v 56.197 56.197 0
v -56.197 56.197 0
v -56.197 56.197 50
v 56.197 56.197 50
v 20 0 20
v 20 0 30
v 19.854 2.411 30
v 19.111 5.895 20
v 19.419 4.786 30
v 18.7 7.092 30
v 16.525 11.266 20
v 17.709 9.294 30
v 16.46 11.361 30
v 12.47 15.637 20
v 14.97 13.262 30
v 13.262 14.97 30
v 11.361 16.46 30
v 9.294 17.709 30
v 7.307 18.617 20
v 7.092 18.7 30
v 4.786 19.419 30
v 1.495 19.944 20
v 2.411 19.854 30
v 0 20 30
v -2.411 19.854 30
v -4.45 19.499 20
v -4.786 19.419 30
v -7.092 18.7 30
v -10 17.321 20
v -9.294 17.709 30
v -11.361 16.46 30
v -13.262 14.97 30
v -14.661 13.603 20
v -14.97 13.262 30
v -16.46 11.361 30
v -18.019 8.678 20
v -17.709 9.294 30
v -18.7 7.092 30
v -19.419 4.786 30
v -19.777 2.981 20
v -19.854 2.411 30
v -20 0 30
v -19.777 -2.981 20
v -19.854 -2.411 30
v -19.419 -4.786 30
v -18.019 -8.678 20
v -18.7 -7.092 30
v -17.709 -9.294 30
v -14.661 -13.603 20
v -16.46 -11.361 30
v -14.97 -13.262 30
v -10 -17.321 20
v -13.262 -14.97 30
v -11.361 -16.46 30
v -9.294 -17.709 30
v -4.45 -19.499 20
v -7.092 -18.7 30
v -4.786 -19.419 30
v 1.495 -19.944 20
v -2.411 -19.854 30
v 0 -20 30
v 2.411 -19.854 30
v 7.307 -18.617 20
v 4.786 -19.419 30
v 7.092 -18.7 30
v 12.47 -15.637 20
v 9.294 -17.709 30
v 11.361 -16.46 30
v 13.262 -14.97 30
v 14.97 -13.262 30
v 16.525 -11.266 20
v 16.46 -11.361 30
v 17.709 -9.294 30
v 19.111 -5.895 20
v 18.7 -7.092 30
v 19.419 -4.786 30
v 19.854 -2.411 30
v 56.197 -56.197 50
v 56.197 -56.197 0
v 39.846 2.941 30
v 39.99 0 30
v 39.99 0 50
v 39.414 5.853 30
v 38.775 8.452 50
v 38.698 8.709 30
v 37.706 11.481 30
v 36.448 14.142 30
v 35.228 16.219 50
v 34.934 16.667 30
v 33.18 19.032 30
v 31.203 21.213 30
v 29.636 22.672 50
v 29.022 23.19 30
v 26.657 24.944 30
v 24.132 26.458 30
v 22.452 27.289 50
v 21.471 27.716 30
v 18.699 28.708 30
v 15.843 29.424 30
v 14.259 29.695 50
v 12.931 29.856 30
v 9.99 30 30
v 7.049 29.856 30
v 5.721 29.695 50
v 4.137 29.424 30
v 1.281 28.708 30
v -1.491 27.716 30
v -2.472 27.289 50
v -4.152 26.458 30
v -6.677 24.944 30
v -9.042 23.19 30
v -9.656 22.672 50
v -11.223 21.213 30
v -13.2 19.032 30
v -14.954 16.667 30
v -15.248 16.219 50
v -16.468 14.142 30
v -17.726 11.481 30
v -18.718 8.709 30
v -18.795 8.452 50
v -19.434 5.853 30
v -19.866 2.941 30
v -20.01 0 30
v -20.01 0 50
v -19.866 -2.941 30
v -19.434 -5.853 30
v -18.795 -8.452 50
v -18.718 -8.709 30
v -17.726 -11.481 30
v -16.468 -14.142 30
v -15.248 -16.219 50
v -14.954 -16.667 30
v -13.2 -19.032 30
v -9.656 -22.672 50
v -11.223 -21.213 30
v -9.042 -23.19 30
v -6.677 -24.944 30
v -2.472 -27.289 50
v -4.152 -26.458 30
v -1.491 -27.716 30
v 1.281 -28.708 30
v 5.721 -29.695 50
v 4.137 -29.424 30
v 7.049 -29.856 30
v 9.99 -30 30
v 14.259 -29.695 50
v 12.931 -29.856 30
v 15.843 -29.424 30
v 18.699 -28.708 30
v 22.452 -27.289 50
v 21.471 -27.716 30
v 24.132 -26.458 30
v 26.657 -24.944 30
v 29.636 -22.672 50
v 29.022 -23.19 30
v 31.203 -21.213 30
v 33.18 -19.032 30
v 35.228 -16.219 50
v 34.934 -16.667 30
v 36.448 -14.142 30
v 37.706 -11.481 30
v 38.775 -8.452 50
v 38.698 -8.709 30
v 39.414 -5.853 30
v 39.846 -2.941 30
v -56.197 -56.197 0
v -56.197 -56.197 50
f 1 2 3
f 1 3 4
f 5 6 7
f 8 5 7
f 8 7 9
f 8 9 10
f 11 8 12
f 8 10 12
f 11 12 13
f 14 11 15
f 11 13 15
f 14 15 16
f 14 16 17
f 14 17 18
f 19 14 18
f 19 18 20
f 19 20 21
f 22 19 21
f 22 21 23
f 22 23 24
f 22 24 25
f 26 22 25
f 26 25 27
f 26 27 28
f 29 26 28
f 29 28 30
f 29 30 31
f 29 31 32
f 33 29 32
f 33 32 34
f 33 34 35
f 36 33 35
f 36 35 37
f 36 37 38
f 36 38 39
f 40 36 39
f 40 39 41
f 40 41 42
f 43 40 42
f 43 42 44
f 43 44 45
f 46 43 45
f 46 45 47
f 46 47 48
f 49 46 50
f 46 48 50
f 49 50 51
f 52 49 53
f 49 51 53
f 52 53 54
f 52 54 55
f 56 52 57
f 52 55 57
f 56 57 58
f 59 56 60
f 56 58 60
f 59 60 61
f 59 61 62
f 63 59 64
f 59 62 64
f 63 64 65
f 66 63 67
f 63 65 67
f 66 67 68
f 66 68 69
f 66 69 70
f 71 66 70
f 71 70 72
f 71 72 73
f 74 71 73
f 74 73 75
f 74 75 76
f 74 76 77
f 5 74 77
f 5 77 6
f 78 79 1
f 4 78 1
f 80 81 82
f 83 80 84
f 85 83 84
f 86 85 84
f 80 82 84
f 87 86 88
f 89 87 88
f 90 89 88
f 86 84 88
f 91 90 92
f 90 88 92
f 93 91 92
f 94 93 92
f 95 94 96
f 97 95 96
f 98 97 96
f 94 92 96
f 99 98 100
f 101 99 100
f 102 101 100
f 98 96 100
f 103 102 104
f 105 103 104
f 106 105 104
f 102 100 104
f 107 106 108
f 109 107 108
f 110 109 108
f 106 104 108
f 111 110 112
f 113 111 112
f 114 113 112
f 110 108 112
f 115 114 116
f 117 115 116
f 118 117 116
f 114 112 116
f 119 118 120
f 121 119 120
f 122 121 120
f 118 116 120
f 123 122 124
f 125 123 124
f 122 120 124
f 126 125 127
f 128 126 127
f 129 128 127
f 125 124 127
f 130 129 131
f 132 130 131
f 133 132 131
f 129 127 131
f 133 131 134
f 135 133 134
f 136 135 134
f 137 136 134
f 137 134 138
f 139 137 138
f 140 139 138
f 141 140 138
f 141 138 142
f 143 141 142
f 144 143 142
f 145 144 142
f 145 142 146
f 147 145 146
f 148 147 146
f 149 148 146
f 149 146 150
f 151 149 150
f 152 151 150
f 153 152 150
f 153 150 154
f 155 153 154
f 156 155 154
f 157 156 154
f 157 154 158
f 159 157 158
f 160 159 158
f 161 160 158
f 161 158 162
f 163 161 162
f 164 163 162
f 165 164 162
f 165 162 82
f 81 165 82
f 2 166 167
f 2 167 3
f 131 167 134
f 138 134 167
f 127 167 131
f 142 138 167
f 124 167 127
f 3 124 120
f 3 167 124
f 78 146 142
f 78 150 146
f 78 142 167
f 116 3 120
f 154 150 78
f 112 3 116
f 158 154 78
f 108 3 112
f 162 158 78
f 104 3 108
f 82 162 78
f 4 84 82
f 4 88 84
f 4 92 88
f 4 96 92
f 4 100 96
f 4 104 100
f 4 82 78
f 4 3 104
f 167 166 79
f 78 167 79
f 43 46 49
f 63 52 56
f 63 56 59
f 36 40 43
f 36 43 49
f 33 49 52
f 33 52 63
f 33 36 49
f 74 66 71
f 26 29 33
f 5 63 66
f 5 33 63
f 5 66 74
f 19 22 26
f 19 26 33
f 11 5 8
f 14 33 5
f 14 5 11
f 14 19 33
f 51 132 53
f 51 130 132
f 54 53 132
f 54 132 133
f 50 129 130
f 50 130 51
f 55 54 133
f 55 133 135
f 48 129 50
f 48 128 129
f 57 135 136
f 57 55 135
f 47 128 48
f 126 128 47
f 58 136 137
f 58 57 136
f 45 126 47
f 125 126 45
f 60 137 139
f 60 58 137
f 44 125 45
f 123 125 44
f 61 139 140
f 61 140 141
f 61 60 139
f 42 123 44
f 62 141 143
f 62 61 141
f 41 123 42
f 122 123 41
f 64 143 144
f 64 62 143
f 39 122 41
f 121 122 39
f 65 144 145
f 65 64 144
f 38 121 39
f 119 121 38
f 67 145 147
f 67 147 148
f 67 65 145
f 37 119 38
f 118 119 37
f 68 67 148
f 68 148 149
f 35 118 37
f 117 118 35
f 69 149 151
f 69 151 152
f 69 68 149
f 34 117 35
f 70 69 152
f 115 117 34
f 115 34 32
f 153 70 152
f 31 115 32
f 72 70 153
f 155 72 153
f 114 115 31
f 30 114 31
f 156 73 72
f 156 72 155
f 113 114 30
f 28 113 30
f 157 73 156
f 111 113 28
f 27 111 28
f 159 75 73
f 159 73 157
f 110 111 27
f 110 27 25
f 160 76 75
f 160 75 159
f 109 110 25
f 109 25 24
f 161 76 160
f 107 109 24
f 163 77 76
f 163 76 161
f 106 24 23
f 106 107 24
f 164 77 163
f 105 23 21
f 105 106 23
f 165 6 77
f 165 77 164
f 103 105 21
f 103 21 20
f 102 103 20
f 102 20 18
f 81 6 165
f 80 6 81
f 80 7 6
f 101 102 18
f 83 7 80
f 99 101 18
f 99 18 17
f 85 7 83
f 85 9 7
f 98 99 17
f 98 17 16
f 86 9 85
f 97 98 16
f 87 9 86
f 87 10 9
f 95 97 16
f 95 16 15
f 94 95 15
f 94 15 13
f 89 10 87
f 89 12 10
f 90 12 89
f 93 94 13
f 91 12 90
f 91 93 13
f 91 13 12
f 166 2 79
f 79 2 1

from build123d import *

# Parameters (mm, degrees)
F0_W     = 112.393752
F0_H     = 112.393752
F1_DEPTH = 50
F2_R     = 20
F3_DEPTH = 30
F2_R_2   = 30
F4_DEPTH = 20


with BuildPart() as f1:
    # F0 (on Top) → F1 (new body)
    with BuildSketch(Plane.XY):
        Rectangle(F0_W, F0_H)
    extrude(amount=F1_DEPTH)

    # F2 (on face) → F3 (cut)
    with BuildSketch(Plane.XY.offset(50)):
        Circle(F2_R)
    extrude(amount=-F3_DEPTH, mode=Mode.SUBTRACT)

    # F2 (on face) → F4 (cut)
    with BuildSketch(Plane.XY.offset(50)):
        with Locations((9.99, 0)):
            Circle(F2_R_2)
        Circle(F2_R, mode=Mode.SUBTRACT)
    extrude(amount=-F4_DEPTH, mode=Mode.SUBTRACT)


solid = f1.part
